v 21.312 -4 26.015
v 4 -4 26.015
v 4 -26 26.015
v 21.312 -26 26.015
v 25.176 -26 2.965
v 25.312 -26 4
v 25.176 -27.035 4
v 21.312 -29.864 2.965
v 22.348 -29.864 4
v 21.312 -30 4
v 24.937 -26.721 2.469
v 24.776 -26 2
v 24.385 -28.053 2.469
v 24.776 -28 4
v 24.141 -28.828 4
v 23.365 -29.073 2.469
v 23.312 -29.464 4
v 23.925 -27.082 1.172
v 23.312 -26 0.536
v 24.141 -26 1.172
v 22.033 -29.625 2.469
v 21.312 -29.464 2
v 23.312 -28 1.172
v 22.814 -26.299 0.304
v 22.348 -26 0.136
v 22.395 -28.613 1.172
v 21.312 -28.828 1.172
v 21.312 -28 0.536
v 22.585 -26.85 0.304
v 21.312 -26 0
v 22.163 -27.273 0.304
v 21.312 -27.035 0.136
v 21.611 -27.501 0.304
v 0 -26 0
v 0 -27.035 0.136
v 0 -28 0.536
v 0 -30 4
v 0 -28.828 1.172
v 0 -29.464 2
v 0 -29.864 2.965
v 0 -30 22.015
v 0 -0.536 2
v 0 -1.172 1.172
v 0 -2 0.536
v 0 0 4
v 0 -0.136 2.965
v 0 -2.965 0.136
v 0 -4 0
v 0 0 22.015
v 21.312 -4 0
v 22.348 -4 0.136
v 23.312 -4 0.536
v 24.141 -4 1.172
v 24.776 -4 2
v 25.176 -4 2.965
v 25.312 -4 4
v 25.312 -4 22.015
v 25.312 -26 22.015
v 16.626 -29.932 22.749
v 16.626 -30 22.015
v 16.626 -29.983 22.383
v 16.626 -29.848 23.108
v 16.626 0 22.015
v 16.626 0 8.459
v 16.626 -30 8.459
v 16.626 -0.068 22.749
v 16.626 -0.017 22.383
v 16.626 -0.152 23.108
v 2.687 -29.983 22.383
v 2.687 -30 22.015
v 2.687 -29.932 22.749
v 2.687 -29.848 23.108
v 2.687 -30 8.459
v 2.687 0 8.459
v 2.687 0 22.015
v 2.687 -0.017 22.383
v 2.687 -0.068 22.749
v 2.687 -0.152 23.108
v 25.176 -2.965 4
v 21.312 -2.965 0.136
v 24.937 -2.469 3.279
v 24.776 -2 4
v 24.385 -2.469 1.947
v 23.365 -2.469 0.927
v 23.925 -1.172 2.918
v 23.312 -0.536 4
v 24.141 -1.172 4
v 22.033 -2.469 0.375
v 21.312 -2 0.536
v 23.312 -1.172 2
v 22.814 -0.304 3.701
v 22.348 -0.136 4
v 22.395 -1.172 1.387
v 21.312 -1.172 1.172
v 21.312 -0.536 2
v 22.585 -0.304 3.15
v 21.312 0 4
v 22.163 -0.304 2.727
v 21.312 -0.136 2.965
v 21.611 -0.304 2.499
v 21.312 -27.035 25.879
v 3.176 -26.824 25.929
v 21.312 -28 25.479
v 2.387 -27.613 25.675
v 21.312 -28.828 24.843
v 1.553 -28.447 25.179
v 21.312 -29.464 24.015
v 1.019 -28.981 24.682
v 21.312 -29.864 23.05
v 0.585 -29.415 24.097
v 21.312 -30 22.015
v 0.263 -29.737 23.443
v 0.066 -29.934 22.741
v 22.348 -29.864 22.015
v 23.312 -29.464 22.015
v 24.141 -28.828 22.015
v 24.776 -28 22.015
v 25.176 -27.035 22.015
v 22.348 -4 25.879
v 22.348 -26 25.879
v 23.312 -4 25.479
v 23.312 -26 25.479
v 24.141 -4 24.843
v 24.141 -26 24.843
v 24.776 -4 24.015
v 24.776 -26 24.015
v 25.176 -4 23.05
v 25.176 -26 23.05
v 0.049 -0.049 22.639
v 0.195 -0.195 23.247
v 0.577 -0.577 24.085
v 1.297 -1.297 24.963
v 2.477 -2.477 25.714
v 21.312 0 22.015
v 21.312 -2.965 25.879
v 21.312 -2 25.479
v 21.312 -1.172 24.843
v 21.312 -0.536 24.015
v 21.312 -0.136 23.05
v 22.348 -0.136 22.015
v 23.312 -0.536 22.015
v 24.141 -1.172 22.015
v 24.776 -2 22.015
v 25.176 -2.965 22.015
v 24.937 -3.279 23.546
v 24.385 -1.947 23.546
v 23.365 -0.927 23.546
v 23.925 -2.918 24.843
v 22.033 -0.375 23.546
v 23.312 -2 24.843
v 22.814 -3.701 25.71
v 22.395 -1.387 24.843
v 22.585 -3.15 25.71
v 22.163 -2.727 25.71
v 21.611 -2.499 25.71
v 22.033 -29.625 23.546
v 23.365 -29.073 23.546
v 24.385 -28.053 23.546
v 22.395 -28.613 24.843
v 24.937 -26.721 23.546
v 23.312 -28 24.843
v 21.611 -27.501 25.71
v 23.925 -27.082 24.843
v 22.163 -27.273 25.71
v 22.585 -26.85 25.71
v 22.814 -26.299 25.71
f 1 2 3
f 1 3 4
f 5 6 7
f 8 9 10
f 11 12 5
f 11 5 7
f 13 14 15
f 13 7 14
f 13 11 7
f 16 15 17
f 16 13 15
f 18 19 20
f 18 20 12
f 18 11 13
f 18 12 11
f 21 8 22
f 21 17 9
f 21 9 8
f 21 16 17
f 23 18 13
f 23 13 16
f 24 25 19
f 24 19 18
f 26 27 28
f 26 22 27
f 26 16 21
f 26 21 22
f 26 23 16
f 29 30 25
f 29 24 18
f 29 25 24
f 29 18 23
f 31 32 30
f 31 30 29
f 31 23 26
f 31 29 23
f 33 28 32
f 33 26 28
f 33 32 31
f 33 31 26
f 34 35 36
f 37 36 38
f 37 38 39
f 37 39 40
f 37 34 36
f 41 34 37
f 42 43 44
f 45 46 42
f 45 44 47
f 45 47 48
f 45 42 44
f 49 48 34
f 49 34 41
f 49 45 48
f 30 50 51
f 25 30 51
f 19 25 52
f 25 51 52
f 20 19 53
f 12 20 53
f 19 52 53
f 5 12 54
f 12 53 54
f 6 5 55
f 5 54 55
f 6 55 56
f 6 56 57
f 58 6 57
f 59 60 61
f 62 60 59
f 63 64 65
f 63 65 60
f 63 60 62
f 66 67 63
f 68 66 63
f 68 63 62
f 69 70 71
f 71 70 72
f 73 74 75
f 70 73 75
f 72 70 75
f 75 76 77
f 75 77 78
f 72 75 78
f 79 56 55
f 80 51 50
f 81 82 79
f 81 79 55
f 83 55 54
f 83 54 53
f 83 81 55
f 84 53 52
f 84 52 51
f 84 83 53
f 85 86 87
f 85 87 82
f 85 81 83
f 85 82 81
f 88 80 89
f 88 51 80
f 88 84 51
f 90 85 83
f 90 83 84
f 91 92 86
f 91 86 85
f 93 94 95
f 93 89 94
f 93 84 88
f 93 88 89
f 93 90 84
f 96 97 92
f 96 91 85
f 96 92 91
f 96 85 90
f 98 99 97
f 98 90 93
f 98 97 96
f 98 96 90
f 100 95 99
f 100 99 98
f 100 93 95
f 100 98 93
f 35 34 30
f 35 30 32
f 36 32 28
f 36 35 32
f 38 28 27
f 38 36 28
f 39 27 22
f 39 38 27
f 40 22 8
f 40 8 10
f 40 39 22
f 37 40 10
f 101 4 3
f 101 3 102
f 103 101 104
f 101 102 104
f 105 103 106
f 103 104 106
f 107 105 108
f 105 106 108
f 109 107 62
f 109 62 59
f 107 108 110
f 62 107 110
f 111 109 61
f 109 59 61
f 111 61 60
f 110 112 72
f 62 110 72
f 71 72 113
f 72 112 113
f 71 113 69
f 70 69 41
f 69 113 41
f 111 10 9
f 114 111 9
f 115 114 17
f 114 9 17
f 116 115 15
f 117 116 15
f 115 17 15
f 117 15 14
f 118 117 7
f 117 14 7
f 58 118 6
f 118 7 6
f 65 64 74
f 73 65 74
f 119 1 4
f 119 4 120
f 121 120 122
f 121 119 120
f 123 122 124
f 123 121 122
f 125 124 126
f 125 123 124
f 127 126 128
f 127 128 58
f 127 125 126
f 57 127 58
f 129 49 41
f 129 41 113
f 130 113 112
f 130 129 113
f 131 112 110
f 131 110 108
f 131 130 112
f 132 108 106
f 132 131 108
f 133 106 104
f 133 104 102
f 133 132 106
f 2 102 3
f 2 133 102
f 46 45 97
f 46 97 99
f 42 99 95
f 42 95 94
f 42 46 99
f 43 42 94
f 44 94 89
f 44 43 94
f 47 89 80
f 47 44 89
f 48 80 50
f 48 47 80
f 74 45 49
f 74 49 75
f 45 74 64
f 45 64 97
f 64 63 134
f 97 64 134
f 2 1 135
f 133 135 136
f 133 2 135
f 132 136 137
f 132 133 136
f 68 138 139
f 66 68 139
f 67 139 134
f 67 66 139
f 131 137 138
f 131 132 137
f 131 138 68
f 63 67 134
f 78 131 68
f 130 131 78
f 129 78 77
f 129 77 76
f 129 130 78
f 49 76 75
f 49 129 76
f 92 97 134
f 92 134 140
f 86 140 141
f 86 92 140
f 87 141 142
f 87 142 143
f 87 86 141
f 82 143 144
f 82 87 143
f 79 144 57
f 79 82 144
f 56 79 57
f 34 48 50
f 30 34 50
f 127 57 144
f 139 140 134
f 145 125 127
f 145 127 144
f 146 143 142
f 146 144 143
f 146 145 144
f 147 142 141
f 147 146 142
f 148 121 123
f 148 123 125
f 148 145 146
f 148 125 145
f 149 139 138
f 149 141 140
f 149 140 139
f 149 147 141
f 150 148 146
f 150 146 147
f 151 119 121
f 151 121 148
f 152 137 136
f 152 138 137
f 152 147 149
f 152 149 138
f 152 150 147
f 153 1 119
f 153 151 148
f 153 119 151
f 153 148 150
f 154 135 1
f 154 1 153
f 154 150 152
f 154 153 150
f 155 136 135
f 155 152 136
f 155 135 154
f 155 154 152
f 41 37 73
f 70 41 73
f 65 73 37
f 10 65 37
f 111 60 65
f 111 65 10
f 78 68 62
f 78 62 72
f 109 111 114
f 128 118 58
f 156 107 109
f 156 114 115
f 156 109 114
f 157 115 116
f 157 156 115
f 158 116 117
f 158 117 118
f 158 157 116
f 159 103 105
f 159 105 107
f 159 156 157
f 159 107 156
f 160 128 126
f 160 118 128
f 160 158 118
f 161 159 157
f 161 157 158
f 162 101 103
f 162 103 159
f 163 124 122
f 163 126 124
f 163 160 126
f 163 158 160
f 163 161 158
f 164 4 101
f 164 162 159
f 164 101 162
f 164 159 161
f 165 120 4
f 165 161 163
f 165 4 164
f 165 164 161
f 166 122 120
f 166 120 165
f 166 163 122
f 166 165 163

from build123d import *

# Parameters (mm, degrees)
F0_W         = 25.3122672439
F0_H         = 26.0148867965
F1_DEPTH     = 30
F2_W         = 13.9388088137
F2_H         = 14.6495383233
F3_DEPTH     = 32
F4_T1_DEPTH  = 18.0148867965
F4_T3_DEPTH  = 31.3122672439
F4_T5_DEPTH  = 36
F4_T7_DEPTH  = 22
F4_T9_DEPTH  = 50
F4_T11_DEPTH = 32.0148867965
F4_S15_W     = 4
F4_S15_H     = 4
F4_T16_DEPTH = 4
F4_S21_W     = 4
F4_S21_H     = 4
F4_T22_DEPTH = 4
F4_S27_W     = 4
F4_S27_H     = 4
F4_T28_DEPTH = 4
F5_T1_DEPTH  = 31.3122672439
F5_S5_W      = 4
F5_S5_H      = 4
F5_T6_DEPTH  = 4


# Not quite as in the source:
# - a fillet or chamfer that OpenCascade refuses, or shapes differently, is made with other operations: its cross-section is extruded or revolved along the edge and cut away or added


with BuildPart() as f1:
    # F0 (on Front) → F1 (new body)
    with BuildSketch(Plane.XZ):
        with Locations((12.6561336219, 13.0074433982)):
            Rectangle(F0_W, F0_H)
    extrude(amount=F1_DEPTH)

    # F2 (on face) → F3 (cut)
    with BuildSketch(Plane(origin=(0, 0, 0), x_dir=(-1, 0, 0), z_dir=(0, 1, 0))):
        with Locations((-9.6562495455, 15.7833071426)):
            Rectangle(F2_W, F2_H)
    extrude(amount=-F3_DEPTH, mode=Mode.SUBTRACT)

    # F4: fillet of radius 4 on 8 edges, made by hand

    # F4_s2 → F4_t1 (cut)
    with BuildSketch(Plane.XY.offset(4)):
        with BuildLine():
            ThreePointArc((21.3122672439, -30), (24.1406943686, -28.8284271247), (25.3122672439, -26))
            Line((25.3122672439, -26), (25.3122672439, -30))
            Line((25.3122672439, -30), (21.3122672439, -30))
        make_face()
    extrude(amount=F4_T1_DEPTH, mode=Mode.SUBTRACT)

    # F4_s4 → F4_t3 (cut)
    with BuildSketch(Plane.YZ.offset(-10)):
        with BuildLine():
            ThreePointArc((-26, 26.0148867965), (-28.8284271247, 24.8433139212), (-30, 22.0148867965))
            Line((-30, 22.0148867965), (-30, 26.0148867965))
            Line((-30, 26.0148867965), (-26, 26.0148867965))
        make_face()
        with BuildLine():
            ThreePointArc((-26, 0), (-28.8284271247, 1.1715728753), (-30, 4))
            Line((-30, 4), (-30, 0))
            Line((-30, 0), (-26, 0))
        make_face()
        with BuildLine():
            ThreePointArc((-4, 26.0148867965), (-1.1715728753, 24.8433139212), (0, 22.0148867965))
            Line((0, 22.0148867965), (0, 26.0148867965))
            Line((0, 26.0148867965), (-4, 26.0148867965))
        make_face()
    extrude(amount=F4_T3_DEPTH, mode=Mode.SUBTRACT)

    # F4_s6 → F4_t5 (cut)
    with BuildSketch(Plane.XZ.offset(-10)):
        with BuildLine():
            ThreePointArc((21.3122672439, 0), (24.1406943686, 1.1715728753), (25.3122672439, 4))
            Line((25.3122672439, 4), (25.3122672439, 0))
            Line((25.3122672439, 0), (21.3122672439, 0))
        make_face()
    extrude(amount=F4_T5_DEPTH, mode=Mode.SUBTRACT)

    # F4_s8 → F4_t7 (cut)
    with BuildSketch(Plane.XZ.offset(4)):
        with BuildLine():
            ThreePointArc((21.3122672439, 26.0148867965), (24.1406943686, 24.8433139212), (25.3122672439, 22.0148867965))
            Line((25.3122672439, 22.0148867965), (25.3122672439, 26.0148867965))
            Line((25.3122672439, 26.0148867965), (21.3122672439, 26.0148867965))
        make_face()
    extrude(amount=F4_T7_DEPTH, mode=Mode.SUBTRACT)

    # F4_s10 → F4_t9 (cut)
    with BuildSketch(Plane.XZ.offset(-10)):
        with BuildLine():
            ThreePointArc((0, 22.0148867965), (1.1715728753, 24.8433139212), (4, 26.0148867965))
            Line((4, 26.0148867965), (0, 26.0148867965))
            Line((0, 26.0148867965), (0, 22.0148867965))
        make_face()
    extrude(amount=F4_T9_DEPTH, mode=Mode.SUBTRACT)

    # F4_s12 → F4_t11 (cut)
    with BuildSketch(Plane.XY.offset(-10)):
        with BuildLine():
            ThreePointArc((21.3122672439, 0), (24.1406943686, -1.1715728753), (25.3122672439, -4))
            Line((25.3122672439, -4), (25.3122672439, 0))
            Line((25.3122672439, 0), (21.3122672439, 0))
        make_face()
    extrude(amount=F4_T11_DEPTH, mode=Mode.SUBTRACT)


with BuildPart() as f4_tool14:
    # F4_s15 → F4_t16 (new body)
    with BuildSketch(Plane.XY.offset(4)):
        with Locations((23.3122672439, -28)):
            Rectangle(F4_S15_W, F4_S15_H)
    extrude(amount=-F4_T16_DEPTH)

    # F4_s17 → F4_t18 (revolve, cut)
    with BuildSketch(Plane(origin=(21.3122672439, -26, 4), x_dir=(-0.7071067812, 0.7071067812, 0), z_dir=(-0.7071067812, -0.7071067812, 0))):
        with BuildLine():
            ThreePointArc((0, -4), (4, 0), (0, 4))
            Line((0, 4), (0, -4))
        make_face()
    revolve(axis=Axis((21.3122672439, -26, 4), (0, 0, -1)), mode=Mode.SUBTRACT)


with BuildPart() as f1_1:
    add(f1.part)

    # F4_t13: cut F4_tool14
    add(f4_tool14.part, mode=Mode.SUBTRACT)


with BuildPart() as f4_tool20:
    # F4_s21 → F4_t22 (new body)
    with BuildSketch(Plane.XY.offset(22.0148867965)):
        with Locations((23.3122672439, -28)):
            Rectangle(F4_S21_W, F4_S21_H)
    extrude(amount=F4_T22_DEPTH)

    # F4_s23 → F4_t24 (revolve, cut)
    with BuildSketch(Plane(origin=(21.3122672439, -26, 22.0148867965), x_dir=(-0.7071067812, 0.7071067812, 0), z_dir=(0.7071067812, 0.7071067812, 0))):
        with BuildLine():
            ThreePointArc((0, -4), (4, 0), (0, 4))
            Line((0, 4), (0, -4))
        make_face()
    revolve(axis=Axis((21.3122672439, -26, 22.0148867965), (0, 0, 1)), mode=Mode.SUBTRACT)


with BuildPart() as f1_2:
    add(f1_1.part)

    # F4_t19: cut F4_tool20
    add(f4_tool20.part, mode=Mode.SUBTRACT)


with BuildPart() as f4_tool26:
    # F4_s27 → F4_t28 (new body)
    with BuildSketch(Plane.XY.offset(22.0148867965)):
        with Locations((23.3122672439, -2)):
            Rectangle(F4_S27_W, F4_S27_H)
    extrude(amount=F4_T28_DEPTH)

    # F4_s29 → F4_t30 (revolve, cut)
    with BuildSketch(Plane(origin=(21.3122672439, -4, 22.0148867965), x_dir=(-0.7071067812, -0.7071067812, 0), z_dir=(-0.7071067812, 0.7071067812, 0))):
        with BuildLine():
            ThreePointArc((0, -4), (4, 0), (0, 4))
            Line((0, 4), (0, -4))
        make_face()
    revolve(axis=Axis((21.3122672439, -4, 22.0148867965), (0, 0, 1)), mode=Mode.SUBTRACT)


with BuildPart() as f1_3:
    add(f1_2.part)

    # F4_t25: cut F4_tool26
    add(f4_tool26.part, mode=Mode.SUBTRACT)

    # F5: fillet of radius 4 on 1 edges, made by hand

    # F5_s2 → F5_t1 (cut)
    with BuildSketch(Plane.YZ.offset(-10)):
        with BuildLine():
            ThreePointArc((0, 4), (-1.1715728753, 1.1715728753), (-4, 0))
            Line((-4, 0), (0, 0))
            Line((0, 0), (0, 4))
        make_face()
    extrude(amount=F5_T1_DEPTH, mode=Mode.SUBTRACT)


with BuildPart() as f5_tool4:
    # F5_s5 → F5_t6 (new body)
    with BuildSketch(Plane.XZ.offset(4)):
        with Locations((23.3122672439, 2)):
            Rectangle(F5_S5_W, F5_S5_H)
    extrude(amount=-F5_T6_DEPTH)

    # F5_s7 → F5_t8 (revolve, cut)
    with BuildSketch(Plane(origin=(21.3122672439, -4, 4), x_dir=(-0.7071067812, 0, 0.7071067812), z_dir=(-0.7071067812, 0, -0.7071067812))):
        with BuildLine():
            ThreePointArc((0, -4), (4, 0), (0, 4))
            Line((0, 4), (0, -4))
        make_face()
    revolve(axis=Axis((21.3122672439, -4, 4), (0, 1, 0)), mode=Mode.SUBTRACT)


with BuildPart() as f1_4:
    add(f1_3.part)

    # F5_t3: cut F5_tool4
    add(f5_tool4.part, mode=Mode.SUBTRACT)


solid = f1_4.part
